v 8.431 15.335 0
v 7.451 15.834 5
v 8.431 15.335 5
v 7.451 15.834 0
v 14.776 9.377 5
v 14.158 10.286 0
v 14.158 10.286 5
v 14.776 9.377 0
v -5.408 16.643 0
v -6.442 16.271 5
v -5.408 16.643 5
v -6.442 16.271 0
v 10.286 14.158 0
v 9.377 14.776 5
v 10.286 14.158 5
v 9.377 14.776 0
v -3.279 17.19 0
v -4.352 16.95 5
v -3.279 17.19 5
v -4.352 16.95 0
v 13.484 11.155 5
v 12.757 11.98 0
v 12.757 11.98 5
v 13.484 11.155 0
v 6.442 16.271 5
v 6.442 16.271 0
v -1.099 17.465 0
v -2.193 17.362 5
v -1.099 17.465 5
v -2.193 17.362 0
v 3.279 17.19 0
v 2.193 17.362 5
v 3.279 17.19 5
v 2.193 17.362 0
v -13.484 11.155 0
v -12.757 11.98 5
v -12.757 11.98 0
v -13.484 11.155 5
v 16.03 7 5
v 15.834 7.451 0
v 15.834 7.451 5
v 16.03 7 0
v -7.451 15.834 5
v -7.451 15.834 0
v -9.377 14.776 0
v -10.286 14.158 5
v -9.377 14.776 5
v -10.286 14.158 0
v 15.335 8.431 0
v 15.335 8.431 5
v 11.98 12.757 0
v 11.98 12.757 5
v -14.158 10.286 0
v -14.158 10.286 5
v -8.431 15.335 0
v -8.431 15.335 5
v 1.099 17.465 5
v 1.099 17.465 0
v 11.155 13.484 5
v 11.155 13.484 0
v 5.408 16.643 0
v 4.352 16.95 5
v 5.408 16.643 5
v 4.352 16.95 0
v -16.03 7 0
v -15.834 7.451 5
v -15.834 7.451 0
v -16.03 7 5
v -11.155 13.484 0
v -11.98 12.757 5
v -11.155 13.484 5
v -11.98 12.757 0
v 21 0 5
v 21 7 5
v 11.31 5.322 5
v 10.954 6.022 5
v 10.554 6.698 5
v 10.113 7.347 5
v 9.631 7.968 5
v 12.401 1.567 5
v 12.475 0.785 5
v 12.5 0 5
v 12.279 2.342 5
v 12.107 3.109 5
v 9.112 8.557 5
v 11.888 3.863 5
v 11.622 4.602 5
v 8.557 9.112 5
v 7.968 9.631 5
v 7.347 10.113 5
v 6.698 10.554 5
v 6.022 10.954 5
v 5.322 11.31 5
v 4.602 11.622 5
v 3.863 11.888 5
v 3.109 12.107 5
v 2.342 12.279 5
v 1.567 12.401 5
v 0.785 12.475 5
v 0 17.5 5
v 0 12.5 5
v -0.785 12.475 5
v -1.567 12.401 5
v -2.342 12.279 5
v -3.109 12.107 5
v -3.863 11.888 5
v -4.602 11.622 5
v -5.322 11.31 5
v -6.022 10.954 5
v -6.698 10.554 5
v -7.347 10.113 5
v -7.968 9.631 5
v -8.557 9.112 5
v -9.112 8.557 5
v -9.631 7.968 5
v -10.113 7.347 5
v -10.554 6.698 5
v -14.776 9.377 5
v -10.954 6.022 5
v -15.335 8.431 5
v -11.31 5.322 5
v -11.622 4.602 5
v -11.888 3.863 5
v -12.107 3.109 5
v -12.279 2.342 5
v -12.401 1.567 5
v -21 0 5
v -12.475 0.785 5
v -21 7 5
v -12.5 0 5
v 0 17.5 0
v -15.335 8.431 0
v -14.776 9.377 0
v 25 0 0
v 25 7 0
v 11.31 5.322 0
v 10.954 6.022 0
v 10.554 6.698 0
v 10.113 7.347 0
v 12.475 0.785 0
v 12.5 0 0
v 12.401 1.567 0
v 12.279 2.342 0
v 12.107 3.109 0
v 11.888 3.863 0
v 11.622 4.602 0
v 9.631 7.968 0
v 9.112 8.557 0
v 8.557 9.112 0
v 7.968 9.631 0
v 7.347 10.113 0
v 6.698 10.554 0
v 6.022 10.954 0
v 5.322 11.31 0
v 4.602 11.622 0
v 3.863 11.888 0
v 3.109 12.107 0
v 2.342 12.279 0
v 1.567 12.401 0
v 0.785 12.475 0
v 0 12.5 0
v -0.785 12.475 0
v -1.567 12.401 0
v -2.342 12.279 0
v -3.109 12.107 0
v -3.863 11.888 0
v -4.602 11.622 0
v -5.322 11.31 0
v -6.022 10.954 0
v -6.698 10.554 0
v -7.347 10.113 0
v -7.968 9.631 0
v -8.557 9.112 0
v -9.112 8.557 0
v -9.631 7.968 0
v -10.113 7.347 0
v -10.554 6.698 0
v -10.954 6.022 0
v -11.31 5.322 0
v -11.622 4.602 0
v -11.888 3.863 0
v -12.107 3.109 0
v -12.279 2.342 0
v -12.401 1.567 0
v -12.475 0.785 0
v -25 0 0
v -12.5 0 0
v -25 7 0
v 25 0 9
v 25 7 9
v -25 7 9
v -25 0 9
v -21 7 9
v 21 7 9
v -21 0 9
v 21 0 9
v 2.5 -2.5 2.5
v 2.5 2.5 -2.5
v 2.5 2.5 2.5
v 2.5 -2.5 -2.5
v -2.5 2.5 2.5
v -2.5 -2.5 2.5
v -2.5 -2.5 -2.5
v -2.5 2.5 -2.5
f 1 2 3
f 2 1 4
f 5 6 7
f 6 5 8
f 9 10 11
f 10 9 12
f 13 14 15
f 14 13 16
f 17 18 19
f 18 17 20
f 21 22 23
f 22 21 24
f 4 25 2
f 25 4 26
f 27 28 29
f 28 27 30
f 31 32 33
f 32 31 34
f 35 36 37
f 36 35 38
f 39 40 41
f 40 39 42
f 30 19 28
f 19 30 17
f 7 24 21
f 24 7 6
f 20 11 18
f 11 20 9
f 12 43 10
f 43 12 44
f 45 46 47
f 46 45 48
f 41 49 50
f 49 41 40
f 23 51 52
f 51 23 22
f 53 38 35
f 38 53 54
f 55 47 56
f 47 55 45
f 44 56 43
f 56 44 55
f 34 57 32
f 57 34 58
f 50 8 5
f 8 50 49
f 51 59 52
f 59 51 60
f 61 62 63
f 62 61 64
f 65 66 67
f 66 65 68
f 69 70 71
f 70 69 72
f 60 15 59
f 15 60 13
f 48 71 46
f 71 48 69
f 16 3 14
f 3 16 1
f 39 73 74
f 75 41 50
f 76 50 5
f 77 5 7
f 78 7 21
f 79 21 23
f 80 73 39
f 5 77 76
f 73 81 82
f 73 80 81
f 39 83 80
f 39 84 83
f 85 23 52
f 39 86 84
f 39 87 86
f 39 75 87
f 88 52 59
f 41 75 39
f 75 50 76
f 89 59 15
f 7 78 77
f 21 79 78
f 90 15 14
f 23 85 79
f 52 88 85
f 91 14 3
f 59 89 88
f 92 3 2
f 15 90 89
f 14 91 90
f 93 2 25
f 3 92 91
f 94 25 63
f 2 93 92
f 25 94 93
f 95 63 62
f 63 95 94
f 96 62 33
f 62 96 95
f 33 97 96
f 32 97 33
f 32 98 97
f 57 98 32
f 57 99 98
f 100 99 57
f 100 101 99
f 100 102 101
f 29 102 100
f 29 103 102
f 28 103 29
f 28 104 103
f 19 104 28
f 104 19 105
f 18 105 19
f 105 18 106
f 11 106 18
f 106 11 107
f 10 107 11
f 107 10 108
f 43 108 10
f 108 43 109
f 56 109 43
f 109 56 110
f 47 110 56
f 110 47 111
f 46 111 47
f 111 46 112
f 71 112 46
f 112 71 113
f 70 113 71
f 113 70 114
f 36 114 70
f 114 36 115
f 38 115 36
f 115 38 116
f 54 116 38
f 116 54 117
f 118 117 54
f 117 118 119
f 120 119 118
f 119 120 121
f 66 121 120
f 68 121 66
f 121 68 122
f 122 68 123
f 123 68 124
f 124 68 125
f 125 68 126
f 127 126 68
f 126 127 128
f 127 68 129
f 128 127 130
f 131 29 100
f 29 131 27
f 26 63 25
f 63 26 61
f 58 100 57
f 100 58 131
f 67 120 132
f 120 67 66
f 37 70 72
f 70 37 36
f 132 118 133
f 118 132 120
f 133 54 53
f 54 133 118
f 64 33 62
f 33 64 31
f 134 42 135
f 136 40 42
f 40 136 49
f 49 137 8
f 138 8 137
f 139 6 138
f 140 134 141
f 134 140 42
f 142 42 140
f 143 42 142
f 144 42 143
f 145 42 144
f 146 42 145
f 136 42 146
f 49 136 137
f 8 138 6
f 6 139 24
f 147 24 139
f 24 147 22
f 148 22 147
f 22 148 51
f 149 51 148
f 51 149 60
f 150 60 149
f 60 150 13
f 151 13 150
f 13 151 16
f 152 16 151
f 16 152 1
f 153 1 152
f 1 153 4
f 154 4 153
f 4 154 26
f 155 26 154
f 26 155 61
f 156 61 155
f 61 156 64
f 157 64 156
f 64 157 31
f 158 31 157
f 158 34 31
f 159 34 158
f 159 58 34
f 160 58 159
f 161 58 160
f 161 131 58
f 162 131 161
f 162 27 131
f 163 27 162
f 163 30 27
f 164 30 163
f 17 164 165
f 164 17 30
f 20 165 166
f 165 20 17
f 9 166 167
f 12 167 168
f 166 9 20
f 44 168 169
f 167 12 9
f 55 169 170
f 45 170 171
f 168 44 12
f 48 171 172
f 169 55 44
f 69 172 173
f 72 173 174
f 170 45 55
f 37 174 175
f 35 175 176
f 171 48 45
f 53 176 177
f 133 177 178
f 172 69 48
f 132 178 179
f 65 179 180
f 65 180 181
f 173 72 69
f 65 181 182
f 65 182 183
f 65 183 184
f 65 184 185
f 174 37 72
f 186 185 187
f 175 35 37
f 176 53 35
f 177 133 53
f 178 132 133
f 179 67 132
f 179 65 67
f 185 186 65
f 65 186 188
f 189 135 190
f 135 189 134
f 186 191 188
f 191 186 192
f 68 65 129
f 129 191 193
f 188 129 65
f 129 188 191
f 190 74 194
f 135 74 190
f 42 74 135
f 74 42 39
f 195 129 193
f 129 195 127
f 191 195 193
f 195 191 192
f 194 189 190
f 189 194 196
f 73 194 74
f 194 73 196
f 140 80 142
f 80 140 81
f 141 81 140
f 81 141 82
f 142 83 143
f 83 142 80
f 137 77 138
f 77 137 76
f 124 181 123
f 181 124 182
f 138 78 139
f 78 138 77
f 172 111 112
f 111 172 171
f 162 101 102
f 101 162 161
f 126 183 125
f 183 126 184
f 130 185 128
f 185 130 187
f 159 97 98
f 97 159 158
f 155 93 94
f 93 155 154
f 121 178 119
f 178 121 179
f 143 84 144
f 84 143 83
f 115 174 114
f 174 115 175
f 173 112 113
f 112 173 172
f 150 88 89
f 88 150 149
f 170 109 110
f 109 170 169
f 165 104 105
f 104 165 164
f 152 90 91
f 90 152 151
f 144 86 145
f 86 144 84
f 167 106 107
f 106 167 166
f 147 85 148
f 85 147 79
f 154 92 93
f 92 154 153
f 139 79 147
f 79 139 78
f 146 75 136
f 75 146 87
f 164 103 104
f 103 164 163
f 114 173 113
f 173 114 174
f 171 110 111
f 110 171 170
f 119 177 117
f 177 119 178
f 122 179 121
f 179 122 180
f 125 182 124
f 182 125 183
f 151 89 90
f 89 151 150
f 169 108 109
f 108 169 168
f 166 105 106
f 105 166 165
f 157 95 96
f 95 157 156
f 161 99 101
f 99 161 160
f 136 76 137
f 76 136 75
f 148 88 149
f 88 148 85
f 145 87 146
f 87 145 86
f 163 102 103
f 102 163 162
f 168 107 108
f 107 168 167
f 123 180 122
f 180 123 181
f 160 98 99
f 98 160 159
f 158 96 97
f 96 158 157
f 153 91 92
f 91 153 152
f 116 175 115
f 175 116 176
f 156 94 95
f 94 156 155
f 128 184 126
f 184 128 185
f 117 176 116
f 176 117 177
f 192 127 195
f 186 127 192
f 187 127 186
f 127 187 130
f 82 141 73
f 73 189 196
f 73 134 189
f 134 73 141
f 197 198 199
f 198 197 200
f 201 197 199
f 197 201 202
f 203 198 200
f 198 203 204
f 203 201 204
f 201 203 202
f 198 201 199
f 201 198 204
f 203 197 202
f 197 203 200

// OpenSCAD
sub_model = "All"; // [All,Hook,Cube1]

hole_size = 25/2;
center_size = 35/2;
arm_length = 50;
arm_width = 14;
main_height = 5;
hook_height = 4;
hook_length = 4;

clip_size = 200;

$fn = 100;

if(sub_model=="All" || sub_model=="Hook")
{
    intersection()
    {
        translate([0,clip_size/2,0]) cube([clip_size, clip_size, clip_size], center = true);

        difference()
        {
            union()
            {
                translate([0,0,main_height/2]) {
                    cylinder(main_height, center_size, center_size, center = true);
                    cube([arm_length, arm_width, main_height], center = true);
                }

                translate([0,0,main_height+hook_height/2]) {
                    offset = arm_length/2 - hook_length/2;
                    translate([-offset,0,0]) cube([hook_length, arm_width, hook_height], center = true);
                    translate([+offset,0,0]) cube([hook_length, arm_width, hook_height], center = true);
                }
            }

            translate([0,0,main_height/2]) cylinder(main_height+1, hole_size, hole_size, center = true);
        }
    }
}

if(sub_model=="All" || sub_model=="Cube1")
{
    cube([5, 5, 5], center = true);
}
